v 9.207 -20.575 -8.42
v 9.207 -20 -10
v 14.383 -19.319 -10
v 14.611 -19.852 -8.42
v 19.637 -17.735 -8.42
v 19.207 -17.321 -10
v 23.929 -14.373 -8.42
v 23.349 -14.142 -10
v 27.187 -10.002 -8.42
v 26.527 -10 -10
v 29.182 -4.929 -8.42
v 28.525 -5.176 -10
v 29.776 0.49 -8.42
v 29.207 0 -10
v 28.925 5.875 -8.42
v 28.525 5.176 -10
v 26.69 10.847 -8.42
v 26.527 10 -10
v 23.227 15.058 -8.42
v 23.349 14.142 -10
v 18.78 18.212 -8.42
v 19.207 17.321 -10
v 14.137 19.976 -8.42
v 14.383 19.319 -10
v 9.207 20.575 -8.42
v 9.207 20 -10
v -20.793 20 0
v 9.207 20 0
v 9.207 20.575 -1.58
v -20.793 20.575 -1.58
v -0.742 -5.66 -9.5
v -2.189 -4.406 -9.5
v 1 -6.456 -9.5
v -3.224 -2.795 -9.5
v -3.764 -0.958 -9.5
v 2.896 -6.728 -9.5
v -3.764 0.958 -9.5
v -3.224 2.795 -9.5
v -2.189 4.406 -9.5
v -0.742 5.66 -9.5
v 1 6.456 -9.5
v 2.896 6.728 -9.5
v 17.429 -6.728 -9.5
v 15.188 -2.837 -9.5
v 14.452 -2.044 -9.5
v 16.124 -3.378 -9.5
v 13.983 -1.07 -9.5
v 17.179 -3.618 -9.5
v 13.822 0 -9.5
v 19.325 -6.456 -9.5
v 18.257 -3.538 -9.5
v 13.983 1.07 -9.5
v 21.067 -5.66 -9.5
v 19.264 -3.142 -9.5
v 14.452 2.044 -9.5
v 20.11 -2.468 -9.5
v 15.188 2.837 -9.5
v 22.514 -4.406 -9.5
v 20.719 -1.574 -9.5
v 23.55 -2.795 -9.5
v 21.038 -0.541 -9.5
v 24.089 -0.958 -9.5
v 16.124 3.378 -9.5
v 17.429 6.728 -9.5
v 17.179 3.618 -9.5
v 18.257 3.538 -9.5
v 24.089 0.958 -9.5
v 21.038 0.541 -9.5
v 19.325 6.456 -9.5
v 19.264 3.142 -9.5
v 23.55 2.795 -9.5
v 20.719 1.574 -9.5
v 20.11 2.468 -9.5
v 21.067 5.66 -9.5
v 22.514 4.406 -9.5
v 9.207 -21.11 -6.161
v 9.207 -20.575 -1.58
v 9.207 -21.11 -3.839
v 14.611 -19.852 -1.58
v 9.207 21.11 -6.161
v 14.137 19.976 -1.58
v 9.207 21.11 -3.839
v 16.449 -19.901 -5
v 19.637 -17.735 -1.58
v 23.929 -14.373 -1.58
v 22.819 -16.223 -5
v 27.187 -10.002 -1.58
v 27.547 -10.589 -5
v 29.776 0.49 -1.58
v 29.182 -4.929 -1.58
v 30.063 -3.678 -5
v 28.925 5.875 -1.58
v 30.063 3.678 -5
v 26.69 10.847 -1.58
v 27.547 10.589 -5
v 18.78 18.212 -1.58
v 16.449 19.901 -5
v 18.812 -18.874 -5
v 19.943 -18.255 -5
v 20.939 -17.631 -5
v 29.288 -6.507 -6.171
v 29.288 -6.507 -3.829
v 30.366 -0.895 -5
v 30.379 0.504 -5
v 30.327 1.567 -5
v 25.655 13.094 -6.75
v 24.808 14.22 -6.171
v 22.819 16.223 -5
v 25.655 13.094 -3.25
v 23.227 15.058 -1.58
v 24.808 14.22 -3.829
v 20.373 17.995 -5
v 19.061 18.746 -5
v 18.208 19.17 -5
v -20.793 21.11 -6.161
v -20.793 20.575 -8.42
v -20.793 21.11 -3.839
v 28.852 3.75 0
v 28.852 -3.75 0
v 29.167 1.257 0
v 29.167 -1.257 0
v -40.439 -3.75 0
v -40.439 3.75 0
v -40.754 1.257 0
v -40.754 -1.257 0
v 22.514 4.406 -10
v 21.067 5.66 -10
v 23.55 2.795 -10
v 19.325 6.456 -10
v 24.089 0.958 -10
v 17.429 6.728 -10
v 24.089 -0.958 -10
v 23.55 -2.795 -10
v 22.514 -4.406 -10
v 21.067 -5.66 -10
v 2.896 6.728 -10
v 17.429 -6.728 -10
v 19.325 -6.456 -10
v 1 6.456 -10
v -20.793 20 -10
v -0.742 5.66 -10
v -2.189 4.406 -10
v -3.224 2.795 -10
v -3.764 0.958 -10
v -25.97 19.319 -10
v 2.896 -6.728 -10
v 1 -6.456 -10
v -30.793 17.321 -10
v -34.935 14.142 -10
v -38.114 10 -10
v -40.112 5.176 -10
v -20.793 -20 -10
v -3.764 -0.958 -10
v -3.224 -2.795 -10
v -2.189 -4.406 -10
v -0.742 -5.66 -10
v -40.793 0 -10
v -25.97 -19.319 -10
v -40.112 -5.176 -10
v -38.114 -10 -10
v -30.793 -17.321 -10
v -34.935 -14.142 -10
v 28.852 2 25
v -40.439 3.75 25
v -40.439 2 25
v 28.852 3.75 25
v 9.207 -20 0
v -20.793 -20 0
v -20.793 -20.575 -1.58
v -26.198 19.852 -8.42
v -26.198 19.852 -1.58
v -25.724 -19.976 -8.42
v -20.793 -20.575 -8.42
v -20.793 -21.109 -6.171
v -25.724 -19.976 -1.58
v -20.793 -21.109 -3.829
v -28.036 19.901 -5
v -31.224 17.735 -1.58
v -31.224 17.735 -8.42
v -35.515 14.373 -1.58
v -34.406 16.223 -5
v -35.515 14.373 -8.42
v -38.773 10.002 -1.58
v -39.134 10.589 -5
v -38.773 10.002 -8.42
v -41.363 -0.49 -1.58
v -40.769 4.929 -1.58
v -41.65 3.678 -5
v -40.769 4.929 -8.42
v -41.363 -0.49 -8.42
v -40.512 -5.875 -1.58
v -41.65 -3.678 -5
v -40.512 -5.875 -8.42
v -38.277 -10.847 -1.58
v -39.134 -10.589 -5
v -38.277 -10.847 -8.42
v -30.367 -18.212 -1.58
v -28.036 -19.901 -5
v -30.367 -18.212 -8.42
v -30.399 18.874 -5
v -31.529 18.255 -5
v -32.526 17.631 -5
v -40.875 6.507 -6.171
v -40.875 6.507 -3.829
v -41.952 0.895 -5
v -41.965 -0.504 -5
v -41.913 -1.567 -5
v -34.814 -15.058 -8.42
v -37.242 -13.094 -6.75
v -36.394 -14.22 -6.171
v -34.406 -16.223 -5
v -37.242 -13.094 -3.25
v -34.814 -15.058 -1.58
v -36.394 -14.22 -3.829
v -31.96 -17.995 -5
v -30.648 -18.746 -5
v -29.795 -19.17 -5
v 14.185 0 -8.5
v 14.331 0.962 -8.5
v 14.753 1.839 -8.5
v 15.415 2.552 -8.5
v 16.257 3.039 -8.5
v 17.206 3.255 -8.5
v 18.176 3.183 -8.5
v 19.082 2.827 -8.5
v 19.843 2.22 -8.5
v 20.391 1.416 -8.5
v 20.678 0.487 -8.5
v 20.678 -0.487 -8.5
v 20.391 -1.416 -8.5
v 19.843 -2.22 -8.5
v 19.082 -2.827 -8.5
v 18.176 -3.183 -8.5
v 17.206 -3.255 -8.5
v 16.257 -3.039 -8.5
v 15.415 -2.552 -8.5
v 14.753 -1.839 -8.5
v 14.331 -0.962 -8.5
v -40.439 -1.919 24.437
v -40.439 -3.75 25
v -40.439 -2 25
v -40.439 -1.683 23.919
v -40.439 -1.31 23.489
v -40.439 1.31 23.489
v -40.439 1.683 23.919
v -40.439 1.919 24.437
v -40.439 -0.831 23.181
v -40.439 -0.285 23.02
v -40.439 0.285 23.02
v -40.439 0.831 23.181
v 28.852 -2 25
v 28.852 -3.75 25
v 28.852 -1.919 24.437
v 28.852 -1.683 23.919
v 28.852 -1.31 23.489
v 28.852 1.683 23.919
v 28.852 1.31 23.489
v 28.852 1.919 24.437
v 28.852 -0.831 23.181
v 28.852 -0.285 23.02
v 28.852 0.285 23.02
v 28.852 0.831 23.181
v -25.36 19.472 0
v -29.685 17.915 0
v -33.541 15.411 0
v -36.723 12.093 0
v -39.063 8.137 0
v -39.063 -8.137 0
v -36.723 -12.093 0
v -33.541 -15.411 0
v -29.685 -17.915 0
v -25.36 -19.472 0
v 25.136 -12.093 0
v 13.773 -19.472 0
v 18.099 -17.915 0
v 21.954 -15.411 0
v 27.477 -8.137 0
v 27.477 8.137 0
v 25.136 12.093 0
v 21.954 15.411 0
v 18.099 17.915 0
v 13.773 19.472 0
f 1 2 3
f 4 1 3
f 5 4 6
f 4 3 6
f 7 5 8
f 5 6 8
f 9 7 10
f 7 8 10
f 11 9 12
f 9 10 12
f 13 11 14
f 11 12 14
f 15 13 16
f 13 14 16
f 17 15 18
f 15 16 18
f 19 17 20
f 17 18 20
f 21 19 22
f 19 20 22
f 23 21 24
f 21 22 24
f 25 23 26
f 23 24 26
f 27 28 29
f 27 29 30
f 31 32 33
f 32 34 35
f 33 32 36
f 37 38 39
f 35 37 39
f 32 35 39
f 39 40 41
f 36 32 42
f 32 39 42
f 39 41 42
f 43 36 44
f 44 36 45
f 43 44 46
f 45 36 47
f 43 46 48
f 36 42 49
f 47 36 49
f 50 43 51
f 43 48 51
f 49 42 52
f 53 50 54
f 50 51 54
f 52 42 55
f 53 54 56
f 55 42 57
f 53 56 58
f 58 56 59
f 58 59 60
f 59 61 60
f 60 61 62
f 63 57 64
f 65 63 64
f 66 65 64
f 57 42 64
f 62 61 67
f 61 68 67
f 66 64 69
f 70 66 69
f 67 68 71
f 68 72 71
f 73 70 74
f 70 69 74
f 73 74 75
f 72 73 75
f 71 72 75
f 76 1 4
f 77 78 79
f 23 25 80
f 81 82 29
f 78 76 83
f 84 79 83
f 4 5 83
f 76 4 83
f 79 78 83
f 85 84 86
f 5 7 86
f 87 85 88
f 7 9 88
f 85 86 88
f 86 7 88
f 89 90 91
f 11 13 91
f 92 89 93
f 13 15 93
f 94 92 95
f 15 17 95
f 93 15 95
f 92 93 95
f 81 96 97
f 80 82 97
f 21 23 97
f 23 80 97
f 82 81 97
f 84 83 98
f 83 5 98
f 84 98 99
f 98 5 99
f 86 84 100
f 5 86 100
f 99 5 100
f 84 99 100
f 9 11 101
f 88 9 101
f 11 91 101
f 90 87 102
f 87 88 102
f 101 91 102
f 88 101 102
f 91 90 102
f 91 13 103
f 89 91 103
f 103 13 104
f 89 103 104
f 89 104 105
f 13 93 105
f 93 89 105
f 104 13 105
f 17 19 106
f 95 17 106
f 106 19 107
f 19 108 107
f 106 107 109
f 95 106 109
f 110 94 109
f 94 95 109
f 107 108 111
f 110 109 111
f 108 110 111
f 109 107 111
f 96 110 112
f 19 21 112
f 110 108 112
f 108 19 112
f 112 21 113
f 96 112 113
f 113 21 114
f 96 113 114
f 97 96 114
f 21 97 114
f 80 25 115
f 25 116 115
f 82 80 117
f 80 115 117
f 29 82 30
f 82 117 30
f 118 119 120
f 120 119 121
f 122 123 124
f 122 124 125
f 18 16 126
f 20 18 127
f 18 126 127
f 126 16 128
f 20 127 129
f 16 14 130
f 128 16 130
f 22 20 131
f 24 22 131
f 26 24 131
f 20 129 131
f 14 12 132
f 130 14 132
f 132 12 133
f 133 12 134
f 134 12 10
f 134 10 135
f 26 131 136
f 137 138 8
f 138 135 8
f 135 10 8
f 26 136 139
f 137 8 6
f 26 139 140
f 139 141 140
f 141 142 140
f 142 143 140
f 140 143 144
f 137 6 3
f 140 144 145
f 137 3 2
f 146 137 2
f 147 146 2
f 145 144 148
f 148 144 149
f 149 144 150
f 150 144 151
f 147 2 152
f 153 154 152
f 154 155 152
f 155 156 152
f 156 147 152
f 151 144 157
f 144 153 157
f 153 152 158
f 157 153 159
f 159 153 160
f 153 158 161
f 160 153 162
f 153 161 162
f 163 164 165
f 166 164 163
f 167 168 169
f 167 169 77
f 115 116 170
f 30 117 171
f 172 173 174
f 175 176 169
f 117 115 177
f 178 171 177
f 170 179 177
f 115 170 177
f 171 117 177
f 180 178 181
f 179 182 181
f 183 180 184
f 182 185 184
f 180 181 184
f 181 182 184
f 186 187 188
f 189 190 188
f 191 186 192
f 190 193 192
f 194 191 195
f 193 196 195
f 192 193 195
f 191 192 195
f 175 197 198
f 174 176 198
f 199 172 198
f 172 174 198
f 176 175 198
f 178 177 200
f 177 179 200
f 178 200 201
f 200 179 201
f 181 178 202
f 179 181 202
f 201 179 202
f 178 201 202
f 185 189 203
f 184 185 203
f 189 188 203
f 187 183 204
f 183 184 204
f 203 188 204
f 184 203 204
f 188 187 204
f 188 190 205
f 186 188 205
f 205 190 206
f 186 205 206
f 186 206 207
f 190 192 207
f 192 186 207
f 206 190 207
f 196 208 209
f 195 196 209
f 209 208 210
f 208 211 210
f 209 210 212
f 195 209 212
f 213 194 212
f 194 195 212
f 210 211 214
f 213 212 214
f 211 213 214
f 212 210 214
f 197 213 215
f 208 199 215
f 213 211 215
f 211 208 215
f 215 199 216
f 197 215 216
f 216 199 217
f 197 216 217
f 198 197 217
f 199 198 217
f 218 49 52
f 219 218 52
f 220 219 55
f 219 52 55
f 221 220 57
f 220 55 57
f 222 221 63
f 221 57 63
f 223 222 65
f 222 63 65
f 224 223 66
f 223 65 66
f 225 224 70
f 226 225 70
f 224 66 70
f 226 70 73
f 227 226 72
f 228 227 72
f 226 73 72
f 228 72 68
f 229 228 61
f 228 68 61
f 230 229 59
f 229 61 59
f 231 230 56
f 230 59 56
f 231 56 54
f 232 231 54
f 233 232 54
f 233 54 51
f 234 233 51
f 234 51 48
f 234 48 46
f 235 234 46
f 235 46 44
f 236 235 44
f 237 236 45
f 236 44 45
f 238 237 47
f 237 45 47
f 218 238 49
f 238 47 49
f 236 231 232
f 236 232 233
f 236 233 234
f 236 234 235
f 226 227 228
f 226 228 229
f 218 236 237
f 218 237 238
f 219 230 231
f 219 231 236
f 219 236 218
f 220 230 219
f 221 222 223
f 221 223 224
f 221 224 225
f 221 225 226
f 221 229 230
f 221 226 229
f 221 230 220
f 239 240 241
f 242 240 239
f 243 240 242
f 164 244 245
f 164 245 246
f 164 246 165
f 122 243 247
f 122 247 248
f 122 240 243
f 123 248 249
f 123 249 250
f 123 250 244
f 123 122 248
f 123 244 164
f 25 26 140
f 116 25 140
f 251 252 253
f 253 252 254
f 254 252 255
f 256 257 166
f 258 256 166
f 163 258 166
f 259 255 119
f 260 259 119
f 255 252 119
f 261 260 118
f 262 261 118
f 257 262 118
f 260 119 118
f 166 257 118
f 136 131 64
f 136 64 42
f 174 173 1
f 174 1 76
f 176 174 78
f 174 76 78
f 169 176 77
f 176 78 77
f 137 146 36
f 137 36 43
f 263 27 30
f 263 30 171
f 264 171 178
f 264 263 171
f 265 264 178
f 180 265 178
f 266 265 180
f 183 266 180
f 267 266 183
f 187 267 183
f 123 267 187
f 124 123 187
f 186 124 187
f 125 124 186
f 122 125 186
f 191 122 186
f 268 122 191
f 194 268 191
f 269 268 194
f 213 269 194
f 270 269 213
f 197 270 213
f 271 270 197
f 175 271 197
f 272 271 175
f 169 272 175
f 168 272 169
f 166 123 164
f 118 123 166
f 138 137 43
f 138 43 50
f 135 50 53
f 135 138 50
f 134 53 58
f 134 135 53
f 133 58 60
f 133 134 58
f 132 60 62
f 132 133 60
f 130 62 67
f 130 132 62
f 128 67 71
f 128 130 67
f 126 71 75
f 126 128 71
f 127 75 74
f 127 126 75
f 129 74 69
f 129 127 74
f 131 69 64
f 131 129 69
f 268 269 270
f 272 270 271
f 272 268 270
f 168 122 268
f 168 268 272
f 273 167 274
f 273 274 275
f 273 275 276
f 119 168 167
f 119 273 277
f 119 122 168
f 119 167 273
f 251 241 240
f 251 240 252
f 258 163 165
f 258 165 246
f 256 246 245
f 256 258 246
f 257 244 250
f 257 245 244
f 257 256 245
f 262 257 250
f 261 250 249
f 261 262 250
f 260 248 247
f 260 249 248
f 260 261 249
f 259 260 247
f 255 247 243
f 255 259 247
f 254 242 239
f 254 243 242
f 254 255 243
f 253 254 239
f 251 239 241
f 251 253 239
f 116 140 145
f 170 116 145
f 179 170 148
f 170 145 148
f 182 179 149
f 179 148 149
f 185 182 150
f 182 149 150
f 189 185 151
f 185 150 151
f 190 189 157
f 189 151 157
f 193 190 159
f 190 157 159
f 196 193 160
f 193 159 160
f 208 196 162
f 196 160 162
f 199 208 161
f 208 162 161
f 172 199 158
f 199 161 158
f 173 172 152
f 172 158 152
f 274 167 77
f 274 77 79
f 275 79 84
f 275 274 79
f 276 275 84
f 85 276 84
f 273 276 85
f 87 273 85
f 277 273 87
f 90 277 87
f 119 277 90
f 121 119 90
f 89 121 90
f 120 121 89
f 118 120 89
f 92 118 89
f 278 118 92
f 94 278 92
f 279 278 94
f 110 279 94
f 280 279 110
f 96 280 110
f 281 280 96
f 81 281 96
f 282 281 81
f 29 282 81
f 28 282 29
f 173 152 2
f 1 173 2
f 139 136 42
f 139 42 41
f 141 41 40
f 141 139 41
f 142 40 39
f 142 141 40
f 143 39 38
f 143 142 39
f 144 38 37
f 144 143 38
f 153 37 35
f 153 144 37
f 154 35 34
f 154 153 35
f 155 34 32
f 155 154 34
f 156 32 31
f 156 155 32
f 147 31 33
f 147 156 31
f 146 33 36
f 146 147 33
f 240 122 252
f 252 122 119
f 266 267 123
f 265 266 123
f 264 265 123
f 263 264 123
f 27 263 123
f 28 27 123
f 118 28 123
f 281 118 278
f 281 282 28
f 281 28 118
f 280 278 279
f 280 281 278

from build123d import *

# Parameters (mm, degrees)
BOSS_EXTRUDE1_DEPTH     = 5
BOSS_EXTRUDE1_DRAFT     = 20
MIRROR1_COPY_1_DEPTH    = 5
MIRROR1_COPY_1_DRAFT    = 20
FILLET1_R               = 10
CUT_EXTRUDE1_DEPTH      = 0.5
SKETCH3_R               = 3.628485538
CUT_EXTRUDE2_DEPTH      = 1
CUT_EXTRUDE2_DRAFT      = -20
SKETCH4_W               = 69.290584113
SKETCH4_H               = 7.5
BOSS_EXTRUDE2_DEPTH     = 25
CUT_EXTRUDE3_DEPTH      = 79.012436871
CUT_EXTRUDE3_DEPTH_BACK = 70


with BuildPart() as part:
    # Sketch1 → Boss-Extrude1 (with draft: the straight prism first)
    with BuildSketch(Plane.XY):
        with BuildLine():
            ThreePointArc((-20.793357934, 20), (-40.793357934, 0), (-20.793357934, -20))
            Line((-20.793357934, -20), (9.206642066, -20))
            ThreePointArc((9.206642066, -20), (29.206642066, 0), (9.206642066, 20))
            Line((9.206642066, 20), (-20.793357934, 20))
        make_face()
    extrude(amount=-BOSS_EXTRUDE1_DEPTH)
    # Boss-Extrude1: the draft: its side faces are tilted about the plane it starts from
    boss_extrude1_sides = [part.faces().sort_by_distance(p)[0] for p in [
        (-5.793357934, -20, -2.5),
        (29.206642066, 0, -2.5),
        (-5.793357934, 20, -2.5),
        (-40.793357934, 0, -2.5),
    ]]
    draft(boss_extrude1_sides, Plane.XY, BOSS_EXTRUDE1_DRAFT)


with BuildPart() as mirror1_copy_1_tool:
    # Mirror1 copy 1 sketch → Mirror1 copy 1 (with draft: the straight prism first)
    with BuildSketch(Plane(origin=(0, 0, -10), x_dir=(1, 0, 0), z_dir=(0, 0, -1))):
        with BuildLine():
            ThreePointArc((-20.793357934, -20), (-40.793357934, 0), (-20.793357934, 20))
            Line((-20.793357934, 20), (9.206642066, 20))
            ThreePointArc((9.206642066, 20), (29.206642066, 0), (9.206642066, -20))
            Line((9.206642066, -20), (-20.793357934, -20))
        make_face()
    extrude(amount=-MIRROR1_COPY_1_DEPTH)
    # Mirror1 copy 1: the draft: its side faces are tilted about the plane it starts from
    mirror1_copy_1_sides = [mirror1_copy_1_tool.faces().sort_by_distance(p)[0] for p in [
        (-5.793357934, -20, -7.5),
        (29.206642066, 0, -7.5),
        (-5.793357934, 20, -7.5),
        (-40.793357934, 0, -7.5),
    ]]
    draft(mirror1_copy_1_sides, Plane(origin=(0, 0, -10), x_dir=(1, 0, 0), z_dir=(0, 0, -1)), MIRROR1_COPY_1_DRAFT)


with BuildPart() as part_1:
    add(part.part)

    # Mirror1 copy 1: add mirror1_copy_1_tool
    add(mirror1_copy_1_tool.part)

    # Fillet1
    fillet1_edges = [part_1.edges().sort_by_distance(p)[0] for p in [
        (31.026493238, 0, -5),
        (-5.793357934, 21.819851171, -5),
        (-42.613209105, 0, -5),
        (-5.793357934, -21.819851171, -5),
    ]]
    fillet(fillet1_edges, radius=FILLET1_R)

    # Sketch2 → Cut-Extrude1 (cut)
    with BuildSketch(Plane(origin=(0, 0, -10), x_dir=(-1, 0, 0), z_dir=(0, 0, -1))):
        with BuildLine():
            Line((-17.429161642, 6.728379016), (-2.895862967, 6.728379016))
            ThreePointArc((-2.895862967, 6.728379016), (3.832516049, 0), (-2.895862967, -6.728379016))
            Line((-2.895862967, -6.728379016), (-17.429161642, -6.728379016))
            ThreePointArc((-17.429161642, -6.728379016), (-24.157540659, 0), (-17.429161642, 6.728379016))
        make_face()
    extrude(amount=-CUT_EXTRUDE1_DEPTH, mode=Mode.SUBTRACT)


with BuildPart() as cut_extrude2_tool:
    # Sketch3 → Cut-Extrude2 (with draft: the straight prism first)
    with BuildSketch(Plane(origin=(0, 0, -9.5), x_dir=(-1, 0, 0), z_dir=(0, 0, -1))):
        with Locations((-17.44999147, 0)):
            Circle(SKETCH3_R)
    extrude(amount=-CUT_EXTRUDE2_DEPTH)
    # Cut-Extrude2: the draft: its side faces are tilted about the plane it starts from
    cut_extrude2_sides = [cut_extrude2_tool.faces().sort_by_distance(p)[0] for p in [
        (21.078477008, 0, -9),
    ]]
    draft(cut_extrude2_sides, Plane(origin=(0, 0, -9.5), x_dir=(-1, 0, 0), z_dir=(0, 0, -1)), CUT_EXTRUDE2_DRAFT)


with BuildPart() as part_2:
    add(part_1.part)

    # Cut-Extrude2: cut by cut_extrude2_tool
    add(cut_extrude2_tool.part, mode=Mode.SUBTRACT)

    # Sketch4 → Boss-Extrude2 (add)
    with BuildSketch(Plane.XY):
        with Locations((-5.793357933, 0)):
            Rectangle(SKETCH4_W, SKETCH4_H)
    extrude(amount=BOSS_EXTRUDE2_DEPTH)

    # Sketch5 → Cut-Extrude3 (cut, two sides: drawn at the far end of the back side and taken through both)
    with BuildSketch(Plane.ZY.offset(40.43864999).offset(-CUT_EXTRUDE3_DEPTH_BACK)):
        with BuildLine():
            Line((118.957682206, 2), (25, 2))
            ThreePointArc((25, 2), (23, 0), (25, -2))
            Line((25, -2), (118.957682206, -2))
            Line((118.957682206, -2), (306.873046617, -2))
            Line((306.873046617, -2), (306.873046617, 2))
            Line((306.873046617, 2), (118.957682206, 2))
        make_face()
    extrude(amount=CUT_EXTRUDE3_DEPTH + CUT_EXTRUDE3_DEPTH_BACK, mode=Mode.SUBTRACT)


solid = part_2.part
